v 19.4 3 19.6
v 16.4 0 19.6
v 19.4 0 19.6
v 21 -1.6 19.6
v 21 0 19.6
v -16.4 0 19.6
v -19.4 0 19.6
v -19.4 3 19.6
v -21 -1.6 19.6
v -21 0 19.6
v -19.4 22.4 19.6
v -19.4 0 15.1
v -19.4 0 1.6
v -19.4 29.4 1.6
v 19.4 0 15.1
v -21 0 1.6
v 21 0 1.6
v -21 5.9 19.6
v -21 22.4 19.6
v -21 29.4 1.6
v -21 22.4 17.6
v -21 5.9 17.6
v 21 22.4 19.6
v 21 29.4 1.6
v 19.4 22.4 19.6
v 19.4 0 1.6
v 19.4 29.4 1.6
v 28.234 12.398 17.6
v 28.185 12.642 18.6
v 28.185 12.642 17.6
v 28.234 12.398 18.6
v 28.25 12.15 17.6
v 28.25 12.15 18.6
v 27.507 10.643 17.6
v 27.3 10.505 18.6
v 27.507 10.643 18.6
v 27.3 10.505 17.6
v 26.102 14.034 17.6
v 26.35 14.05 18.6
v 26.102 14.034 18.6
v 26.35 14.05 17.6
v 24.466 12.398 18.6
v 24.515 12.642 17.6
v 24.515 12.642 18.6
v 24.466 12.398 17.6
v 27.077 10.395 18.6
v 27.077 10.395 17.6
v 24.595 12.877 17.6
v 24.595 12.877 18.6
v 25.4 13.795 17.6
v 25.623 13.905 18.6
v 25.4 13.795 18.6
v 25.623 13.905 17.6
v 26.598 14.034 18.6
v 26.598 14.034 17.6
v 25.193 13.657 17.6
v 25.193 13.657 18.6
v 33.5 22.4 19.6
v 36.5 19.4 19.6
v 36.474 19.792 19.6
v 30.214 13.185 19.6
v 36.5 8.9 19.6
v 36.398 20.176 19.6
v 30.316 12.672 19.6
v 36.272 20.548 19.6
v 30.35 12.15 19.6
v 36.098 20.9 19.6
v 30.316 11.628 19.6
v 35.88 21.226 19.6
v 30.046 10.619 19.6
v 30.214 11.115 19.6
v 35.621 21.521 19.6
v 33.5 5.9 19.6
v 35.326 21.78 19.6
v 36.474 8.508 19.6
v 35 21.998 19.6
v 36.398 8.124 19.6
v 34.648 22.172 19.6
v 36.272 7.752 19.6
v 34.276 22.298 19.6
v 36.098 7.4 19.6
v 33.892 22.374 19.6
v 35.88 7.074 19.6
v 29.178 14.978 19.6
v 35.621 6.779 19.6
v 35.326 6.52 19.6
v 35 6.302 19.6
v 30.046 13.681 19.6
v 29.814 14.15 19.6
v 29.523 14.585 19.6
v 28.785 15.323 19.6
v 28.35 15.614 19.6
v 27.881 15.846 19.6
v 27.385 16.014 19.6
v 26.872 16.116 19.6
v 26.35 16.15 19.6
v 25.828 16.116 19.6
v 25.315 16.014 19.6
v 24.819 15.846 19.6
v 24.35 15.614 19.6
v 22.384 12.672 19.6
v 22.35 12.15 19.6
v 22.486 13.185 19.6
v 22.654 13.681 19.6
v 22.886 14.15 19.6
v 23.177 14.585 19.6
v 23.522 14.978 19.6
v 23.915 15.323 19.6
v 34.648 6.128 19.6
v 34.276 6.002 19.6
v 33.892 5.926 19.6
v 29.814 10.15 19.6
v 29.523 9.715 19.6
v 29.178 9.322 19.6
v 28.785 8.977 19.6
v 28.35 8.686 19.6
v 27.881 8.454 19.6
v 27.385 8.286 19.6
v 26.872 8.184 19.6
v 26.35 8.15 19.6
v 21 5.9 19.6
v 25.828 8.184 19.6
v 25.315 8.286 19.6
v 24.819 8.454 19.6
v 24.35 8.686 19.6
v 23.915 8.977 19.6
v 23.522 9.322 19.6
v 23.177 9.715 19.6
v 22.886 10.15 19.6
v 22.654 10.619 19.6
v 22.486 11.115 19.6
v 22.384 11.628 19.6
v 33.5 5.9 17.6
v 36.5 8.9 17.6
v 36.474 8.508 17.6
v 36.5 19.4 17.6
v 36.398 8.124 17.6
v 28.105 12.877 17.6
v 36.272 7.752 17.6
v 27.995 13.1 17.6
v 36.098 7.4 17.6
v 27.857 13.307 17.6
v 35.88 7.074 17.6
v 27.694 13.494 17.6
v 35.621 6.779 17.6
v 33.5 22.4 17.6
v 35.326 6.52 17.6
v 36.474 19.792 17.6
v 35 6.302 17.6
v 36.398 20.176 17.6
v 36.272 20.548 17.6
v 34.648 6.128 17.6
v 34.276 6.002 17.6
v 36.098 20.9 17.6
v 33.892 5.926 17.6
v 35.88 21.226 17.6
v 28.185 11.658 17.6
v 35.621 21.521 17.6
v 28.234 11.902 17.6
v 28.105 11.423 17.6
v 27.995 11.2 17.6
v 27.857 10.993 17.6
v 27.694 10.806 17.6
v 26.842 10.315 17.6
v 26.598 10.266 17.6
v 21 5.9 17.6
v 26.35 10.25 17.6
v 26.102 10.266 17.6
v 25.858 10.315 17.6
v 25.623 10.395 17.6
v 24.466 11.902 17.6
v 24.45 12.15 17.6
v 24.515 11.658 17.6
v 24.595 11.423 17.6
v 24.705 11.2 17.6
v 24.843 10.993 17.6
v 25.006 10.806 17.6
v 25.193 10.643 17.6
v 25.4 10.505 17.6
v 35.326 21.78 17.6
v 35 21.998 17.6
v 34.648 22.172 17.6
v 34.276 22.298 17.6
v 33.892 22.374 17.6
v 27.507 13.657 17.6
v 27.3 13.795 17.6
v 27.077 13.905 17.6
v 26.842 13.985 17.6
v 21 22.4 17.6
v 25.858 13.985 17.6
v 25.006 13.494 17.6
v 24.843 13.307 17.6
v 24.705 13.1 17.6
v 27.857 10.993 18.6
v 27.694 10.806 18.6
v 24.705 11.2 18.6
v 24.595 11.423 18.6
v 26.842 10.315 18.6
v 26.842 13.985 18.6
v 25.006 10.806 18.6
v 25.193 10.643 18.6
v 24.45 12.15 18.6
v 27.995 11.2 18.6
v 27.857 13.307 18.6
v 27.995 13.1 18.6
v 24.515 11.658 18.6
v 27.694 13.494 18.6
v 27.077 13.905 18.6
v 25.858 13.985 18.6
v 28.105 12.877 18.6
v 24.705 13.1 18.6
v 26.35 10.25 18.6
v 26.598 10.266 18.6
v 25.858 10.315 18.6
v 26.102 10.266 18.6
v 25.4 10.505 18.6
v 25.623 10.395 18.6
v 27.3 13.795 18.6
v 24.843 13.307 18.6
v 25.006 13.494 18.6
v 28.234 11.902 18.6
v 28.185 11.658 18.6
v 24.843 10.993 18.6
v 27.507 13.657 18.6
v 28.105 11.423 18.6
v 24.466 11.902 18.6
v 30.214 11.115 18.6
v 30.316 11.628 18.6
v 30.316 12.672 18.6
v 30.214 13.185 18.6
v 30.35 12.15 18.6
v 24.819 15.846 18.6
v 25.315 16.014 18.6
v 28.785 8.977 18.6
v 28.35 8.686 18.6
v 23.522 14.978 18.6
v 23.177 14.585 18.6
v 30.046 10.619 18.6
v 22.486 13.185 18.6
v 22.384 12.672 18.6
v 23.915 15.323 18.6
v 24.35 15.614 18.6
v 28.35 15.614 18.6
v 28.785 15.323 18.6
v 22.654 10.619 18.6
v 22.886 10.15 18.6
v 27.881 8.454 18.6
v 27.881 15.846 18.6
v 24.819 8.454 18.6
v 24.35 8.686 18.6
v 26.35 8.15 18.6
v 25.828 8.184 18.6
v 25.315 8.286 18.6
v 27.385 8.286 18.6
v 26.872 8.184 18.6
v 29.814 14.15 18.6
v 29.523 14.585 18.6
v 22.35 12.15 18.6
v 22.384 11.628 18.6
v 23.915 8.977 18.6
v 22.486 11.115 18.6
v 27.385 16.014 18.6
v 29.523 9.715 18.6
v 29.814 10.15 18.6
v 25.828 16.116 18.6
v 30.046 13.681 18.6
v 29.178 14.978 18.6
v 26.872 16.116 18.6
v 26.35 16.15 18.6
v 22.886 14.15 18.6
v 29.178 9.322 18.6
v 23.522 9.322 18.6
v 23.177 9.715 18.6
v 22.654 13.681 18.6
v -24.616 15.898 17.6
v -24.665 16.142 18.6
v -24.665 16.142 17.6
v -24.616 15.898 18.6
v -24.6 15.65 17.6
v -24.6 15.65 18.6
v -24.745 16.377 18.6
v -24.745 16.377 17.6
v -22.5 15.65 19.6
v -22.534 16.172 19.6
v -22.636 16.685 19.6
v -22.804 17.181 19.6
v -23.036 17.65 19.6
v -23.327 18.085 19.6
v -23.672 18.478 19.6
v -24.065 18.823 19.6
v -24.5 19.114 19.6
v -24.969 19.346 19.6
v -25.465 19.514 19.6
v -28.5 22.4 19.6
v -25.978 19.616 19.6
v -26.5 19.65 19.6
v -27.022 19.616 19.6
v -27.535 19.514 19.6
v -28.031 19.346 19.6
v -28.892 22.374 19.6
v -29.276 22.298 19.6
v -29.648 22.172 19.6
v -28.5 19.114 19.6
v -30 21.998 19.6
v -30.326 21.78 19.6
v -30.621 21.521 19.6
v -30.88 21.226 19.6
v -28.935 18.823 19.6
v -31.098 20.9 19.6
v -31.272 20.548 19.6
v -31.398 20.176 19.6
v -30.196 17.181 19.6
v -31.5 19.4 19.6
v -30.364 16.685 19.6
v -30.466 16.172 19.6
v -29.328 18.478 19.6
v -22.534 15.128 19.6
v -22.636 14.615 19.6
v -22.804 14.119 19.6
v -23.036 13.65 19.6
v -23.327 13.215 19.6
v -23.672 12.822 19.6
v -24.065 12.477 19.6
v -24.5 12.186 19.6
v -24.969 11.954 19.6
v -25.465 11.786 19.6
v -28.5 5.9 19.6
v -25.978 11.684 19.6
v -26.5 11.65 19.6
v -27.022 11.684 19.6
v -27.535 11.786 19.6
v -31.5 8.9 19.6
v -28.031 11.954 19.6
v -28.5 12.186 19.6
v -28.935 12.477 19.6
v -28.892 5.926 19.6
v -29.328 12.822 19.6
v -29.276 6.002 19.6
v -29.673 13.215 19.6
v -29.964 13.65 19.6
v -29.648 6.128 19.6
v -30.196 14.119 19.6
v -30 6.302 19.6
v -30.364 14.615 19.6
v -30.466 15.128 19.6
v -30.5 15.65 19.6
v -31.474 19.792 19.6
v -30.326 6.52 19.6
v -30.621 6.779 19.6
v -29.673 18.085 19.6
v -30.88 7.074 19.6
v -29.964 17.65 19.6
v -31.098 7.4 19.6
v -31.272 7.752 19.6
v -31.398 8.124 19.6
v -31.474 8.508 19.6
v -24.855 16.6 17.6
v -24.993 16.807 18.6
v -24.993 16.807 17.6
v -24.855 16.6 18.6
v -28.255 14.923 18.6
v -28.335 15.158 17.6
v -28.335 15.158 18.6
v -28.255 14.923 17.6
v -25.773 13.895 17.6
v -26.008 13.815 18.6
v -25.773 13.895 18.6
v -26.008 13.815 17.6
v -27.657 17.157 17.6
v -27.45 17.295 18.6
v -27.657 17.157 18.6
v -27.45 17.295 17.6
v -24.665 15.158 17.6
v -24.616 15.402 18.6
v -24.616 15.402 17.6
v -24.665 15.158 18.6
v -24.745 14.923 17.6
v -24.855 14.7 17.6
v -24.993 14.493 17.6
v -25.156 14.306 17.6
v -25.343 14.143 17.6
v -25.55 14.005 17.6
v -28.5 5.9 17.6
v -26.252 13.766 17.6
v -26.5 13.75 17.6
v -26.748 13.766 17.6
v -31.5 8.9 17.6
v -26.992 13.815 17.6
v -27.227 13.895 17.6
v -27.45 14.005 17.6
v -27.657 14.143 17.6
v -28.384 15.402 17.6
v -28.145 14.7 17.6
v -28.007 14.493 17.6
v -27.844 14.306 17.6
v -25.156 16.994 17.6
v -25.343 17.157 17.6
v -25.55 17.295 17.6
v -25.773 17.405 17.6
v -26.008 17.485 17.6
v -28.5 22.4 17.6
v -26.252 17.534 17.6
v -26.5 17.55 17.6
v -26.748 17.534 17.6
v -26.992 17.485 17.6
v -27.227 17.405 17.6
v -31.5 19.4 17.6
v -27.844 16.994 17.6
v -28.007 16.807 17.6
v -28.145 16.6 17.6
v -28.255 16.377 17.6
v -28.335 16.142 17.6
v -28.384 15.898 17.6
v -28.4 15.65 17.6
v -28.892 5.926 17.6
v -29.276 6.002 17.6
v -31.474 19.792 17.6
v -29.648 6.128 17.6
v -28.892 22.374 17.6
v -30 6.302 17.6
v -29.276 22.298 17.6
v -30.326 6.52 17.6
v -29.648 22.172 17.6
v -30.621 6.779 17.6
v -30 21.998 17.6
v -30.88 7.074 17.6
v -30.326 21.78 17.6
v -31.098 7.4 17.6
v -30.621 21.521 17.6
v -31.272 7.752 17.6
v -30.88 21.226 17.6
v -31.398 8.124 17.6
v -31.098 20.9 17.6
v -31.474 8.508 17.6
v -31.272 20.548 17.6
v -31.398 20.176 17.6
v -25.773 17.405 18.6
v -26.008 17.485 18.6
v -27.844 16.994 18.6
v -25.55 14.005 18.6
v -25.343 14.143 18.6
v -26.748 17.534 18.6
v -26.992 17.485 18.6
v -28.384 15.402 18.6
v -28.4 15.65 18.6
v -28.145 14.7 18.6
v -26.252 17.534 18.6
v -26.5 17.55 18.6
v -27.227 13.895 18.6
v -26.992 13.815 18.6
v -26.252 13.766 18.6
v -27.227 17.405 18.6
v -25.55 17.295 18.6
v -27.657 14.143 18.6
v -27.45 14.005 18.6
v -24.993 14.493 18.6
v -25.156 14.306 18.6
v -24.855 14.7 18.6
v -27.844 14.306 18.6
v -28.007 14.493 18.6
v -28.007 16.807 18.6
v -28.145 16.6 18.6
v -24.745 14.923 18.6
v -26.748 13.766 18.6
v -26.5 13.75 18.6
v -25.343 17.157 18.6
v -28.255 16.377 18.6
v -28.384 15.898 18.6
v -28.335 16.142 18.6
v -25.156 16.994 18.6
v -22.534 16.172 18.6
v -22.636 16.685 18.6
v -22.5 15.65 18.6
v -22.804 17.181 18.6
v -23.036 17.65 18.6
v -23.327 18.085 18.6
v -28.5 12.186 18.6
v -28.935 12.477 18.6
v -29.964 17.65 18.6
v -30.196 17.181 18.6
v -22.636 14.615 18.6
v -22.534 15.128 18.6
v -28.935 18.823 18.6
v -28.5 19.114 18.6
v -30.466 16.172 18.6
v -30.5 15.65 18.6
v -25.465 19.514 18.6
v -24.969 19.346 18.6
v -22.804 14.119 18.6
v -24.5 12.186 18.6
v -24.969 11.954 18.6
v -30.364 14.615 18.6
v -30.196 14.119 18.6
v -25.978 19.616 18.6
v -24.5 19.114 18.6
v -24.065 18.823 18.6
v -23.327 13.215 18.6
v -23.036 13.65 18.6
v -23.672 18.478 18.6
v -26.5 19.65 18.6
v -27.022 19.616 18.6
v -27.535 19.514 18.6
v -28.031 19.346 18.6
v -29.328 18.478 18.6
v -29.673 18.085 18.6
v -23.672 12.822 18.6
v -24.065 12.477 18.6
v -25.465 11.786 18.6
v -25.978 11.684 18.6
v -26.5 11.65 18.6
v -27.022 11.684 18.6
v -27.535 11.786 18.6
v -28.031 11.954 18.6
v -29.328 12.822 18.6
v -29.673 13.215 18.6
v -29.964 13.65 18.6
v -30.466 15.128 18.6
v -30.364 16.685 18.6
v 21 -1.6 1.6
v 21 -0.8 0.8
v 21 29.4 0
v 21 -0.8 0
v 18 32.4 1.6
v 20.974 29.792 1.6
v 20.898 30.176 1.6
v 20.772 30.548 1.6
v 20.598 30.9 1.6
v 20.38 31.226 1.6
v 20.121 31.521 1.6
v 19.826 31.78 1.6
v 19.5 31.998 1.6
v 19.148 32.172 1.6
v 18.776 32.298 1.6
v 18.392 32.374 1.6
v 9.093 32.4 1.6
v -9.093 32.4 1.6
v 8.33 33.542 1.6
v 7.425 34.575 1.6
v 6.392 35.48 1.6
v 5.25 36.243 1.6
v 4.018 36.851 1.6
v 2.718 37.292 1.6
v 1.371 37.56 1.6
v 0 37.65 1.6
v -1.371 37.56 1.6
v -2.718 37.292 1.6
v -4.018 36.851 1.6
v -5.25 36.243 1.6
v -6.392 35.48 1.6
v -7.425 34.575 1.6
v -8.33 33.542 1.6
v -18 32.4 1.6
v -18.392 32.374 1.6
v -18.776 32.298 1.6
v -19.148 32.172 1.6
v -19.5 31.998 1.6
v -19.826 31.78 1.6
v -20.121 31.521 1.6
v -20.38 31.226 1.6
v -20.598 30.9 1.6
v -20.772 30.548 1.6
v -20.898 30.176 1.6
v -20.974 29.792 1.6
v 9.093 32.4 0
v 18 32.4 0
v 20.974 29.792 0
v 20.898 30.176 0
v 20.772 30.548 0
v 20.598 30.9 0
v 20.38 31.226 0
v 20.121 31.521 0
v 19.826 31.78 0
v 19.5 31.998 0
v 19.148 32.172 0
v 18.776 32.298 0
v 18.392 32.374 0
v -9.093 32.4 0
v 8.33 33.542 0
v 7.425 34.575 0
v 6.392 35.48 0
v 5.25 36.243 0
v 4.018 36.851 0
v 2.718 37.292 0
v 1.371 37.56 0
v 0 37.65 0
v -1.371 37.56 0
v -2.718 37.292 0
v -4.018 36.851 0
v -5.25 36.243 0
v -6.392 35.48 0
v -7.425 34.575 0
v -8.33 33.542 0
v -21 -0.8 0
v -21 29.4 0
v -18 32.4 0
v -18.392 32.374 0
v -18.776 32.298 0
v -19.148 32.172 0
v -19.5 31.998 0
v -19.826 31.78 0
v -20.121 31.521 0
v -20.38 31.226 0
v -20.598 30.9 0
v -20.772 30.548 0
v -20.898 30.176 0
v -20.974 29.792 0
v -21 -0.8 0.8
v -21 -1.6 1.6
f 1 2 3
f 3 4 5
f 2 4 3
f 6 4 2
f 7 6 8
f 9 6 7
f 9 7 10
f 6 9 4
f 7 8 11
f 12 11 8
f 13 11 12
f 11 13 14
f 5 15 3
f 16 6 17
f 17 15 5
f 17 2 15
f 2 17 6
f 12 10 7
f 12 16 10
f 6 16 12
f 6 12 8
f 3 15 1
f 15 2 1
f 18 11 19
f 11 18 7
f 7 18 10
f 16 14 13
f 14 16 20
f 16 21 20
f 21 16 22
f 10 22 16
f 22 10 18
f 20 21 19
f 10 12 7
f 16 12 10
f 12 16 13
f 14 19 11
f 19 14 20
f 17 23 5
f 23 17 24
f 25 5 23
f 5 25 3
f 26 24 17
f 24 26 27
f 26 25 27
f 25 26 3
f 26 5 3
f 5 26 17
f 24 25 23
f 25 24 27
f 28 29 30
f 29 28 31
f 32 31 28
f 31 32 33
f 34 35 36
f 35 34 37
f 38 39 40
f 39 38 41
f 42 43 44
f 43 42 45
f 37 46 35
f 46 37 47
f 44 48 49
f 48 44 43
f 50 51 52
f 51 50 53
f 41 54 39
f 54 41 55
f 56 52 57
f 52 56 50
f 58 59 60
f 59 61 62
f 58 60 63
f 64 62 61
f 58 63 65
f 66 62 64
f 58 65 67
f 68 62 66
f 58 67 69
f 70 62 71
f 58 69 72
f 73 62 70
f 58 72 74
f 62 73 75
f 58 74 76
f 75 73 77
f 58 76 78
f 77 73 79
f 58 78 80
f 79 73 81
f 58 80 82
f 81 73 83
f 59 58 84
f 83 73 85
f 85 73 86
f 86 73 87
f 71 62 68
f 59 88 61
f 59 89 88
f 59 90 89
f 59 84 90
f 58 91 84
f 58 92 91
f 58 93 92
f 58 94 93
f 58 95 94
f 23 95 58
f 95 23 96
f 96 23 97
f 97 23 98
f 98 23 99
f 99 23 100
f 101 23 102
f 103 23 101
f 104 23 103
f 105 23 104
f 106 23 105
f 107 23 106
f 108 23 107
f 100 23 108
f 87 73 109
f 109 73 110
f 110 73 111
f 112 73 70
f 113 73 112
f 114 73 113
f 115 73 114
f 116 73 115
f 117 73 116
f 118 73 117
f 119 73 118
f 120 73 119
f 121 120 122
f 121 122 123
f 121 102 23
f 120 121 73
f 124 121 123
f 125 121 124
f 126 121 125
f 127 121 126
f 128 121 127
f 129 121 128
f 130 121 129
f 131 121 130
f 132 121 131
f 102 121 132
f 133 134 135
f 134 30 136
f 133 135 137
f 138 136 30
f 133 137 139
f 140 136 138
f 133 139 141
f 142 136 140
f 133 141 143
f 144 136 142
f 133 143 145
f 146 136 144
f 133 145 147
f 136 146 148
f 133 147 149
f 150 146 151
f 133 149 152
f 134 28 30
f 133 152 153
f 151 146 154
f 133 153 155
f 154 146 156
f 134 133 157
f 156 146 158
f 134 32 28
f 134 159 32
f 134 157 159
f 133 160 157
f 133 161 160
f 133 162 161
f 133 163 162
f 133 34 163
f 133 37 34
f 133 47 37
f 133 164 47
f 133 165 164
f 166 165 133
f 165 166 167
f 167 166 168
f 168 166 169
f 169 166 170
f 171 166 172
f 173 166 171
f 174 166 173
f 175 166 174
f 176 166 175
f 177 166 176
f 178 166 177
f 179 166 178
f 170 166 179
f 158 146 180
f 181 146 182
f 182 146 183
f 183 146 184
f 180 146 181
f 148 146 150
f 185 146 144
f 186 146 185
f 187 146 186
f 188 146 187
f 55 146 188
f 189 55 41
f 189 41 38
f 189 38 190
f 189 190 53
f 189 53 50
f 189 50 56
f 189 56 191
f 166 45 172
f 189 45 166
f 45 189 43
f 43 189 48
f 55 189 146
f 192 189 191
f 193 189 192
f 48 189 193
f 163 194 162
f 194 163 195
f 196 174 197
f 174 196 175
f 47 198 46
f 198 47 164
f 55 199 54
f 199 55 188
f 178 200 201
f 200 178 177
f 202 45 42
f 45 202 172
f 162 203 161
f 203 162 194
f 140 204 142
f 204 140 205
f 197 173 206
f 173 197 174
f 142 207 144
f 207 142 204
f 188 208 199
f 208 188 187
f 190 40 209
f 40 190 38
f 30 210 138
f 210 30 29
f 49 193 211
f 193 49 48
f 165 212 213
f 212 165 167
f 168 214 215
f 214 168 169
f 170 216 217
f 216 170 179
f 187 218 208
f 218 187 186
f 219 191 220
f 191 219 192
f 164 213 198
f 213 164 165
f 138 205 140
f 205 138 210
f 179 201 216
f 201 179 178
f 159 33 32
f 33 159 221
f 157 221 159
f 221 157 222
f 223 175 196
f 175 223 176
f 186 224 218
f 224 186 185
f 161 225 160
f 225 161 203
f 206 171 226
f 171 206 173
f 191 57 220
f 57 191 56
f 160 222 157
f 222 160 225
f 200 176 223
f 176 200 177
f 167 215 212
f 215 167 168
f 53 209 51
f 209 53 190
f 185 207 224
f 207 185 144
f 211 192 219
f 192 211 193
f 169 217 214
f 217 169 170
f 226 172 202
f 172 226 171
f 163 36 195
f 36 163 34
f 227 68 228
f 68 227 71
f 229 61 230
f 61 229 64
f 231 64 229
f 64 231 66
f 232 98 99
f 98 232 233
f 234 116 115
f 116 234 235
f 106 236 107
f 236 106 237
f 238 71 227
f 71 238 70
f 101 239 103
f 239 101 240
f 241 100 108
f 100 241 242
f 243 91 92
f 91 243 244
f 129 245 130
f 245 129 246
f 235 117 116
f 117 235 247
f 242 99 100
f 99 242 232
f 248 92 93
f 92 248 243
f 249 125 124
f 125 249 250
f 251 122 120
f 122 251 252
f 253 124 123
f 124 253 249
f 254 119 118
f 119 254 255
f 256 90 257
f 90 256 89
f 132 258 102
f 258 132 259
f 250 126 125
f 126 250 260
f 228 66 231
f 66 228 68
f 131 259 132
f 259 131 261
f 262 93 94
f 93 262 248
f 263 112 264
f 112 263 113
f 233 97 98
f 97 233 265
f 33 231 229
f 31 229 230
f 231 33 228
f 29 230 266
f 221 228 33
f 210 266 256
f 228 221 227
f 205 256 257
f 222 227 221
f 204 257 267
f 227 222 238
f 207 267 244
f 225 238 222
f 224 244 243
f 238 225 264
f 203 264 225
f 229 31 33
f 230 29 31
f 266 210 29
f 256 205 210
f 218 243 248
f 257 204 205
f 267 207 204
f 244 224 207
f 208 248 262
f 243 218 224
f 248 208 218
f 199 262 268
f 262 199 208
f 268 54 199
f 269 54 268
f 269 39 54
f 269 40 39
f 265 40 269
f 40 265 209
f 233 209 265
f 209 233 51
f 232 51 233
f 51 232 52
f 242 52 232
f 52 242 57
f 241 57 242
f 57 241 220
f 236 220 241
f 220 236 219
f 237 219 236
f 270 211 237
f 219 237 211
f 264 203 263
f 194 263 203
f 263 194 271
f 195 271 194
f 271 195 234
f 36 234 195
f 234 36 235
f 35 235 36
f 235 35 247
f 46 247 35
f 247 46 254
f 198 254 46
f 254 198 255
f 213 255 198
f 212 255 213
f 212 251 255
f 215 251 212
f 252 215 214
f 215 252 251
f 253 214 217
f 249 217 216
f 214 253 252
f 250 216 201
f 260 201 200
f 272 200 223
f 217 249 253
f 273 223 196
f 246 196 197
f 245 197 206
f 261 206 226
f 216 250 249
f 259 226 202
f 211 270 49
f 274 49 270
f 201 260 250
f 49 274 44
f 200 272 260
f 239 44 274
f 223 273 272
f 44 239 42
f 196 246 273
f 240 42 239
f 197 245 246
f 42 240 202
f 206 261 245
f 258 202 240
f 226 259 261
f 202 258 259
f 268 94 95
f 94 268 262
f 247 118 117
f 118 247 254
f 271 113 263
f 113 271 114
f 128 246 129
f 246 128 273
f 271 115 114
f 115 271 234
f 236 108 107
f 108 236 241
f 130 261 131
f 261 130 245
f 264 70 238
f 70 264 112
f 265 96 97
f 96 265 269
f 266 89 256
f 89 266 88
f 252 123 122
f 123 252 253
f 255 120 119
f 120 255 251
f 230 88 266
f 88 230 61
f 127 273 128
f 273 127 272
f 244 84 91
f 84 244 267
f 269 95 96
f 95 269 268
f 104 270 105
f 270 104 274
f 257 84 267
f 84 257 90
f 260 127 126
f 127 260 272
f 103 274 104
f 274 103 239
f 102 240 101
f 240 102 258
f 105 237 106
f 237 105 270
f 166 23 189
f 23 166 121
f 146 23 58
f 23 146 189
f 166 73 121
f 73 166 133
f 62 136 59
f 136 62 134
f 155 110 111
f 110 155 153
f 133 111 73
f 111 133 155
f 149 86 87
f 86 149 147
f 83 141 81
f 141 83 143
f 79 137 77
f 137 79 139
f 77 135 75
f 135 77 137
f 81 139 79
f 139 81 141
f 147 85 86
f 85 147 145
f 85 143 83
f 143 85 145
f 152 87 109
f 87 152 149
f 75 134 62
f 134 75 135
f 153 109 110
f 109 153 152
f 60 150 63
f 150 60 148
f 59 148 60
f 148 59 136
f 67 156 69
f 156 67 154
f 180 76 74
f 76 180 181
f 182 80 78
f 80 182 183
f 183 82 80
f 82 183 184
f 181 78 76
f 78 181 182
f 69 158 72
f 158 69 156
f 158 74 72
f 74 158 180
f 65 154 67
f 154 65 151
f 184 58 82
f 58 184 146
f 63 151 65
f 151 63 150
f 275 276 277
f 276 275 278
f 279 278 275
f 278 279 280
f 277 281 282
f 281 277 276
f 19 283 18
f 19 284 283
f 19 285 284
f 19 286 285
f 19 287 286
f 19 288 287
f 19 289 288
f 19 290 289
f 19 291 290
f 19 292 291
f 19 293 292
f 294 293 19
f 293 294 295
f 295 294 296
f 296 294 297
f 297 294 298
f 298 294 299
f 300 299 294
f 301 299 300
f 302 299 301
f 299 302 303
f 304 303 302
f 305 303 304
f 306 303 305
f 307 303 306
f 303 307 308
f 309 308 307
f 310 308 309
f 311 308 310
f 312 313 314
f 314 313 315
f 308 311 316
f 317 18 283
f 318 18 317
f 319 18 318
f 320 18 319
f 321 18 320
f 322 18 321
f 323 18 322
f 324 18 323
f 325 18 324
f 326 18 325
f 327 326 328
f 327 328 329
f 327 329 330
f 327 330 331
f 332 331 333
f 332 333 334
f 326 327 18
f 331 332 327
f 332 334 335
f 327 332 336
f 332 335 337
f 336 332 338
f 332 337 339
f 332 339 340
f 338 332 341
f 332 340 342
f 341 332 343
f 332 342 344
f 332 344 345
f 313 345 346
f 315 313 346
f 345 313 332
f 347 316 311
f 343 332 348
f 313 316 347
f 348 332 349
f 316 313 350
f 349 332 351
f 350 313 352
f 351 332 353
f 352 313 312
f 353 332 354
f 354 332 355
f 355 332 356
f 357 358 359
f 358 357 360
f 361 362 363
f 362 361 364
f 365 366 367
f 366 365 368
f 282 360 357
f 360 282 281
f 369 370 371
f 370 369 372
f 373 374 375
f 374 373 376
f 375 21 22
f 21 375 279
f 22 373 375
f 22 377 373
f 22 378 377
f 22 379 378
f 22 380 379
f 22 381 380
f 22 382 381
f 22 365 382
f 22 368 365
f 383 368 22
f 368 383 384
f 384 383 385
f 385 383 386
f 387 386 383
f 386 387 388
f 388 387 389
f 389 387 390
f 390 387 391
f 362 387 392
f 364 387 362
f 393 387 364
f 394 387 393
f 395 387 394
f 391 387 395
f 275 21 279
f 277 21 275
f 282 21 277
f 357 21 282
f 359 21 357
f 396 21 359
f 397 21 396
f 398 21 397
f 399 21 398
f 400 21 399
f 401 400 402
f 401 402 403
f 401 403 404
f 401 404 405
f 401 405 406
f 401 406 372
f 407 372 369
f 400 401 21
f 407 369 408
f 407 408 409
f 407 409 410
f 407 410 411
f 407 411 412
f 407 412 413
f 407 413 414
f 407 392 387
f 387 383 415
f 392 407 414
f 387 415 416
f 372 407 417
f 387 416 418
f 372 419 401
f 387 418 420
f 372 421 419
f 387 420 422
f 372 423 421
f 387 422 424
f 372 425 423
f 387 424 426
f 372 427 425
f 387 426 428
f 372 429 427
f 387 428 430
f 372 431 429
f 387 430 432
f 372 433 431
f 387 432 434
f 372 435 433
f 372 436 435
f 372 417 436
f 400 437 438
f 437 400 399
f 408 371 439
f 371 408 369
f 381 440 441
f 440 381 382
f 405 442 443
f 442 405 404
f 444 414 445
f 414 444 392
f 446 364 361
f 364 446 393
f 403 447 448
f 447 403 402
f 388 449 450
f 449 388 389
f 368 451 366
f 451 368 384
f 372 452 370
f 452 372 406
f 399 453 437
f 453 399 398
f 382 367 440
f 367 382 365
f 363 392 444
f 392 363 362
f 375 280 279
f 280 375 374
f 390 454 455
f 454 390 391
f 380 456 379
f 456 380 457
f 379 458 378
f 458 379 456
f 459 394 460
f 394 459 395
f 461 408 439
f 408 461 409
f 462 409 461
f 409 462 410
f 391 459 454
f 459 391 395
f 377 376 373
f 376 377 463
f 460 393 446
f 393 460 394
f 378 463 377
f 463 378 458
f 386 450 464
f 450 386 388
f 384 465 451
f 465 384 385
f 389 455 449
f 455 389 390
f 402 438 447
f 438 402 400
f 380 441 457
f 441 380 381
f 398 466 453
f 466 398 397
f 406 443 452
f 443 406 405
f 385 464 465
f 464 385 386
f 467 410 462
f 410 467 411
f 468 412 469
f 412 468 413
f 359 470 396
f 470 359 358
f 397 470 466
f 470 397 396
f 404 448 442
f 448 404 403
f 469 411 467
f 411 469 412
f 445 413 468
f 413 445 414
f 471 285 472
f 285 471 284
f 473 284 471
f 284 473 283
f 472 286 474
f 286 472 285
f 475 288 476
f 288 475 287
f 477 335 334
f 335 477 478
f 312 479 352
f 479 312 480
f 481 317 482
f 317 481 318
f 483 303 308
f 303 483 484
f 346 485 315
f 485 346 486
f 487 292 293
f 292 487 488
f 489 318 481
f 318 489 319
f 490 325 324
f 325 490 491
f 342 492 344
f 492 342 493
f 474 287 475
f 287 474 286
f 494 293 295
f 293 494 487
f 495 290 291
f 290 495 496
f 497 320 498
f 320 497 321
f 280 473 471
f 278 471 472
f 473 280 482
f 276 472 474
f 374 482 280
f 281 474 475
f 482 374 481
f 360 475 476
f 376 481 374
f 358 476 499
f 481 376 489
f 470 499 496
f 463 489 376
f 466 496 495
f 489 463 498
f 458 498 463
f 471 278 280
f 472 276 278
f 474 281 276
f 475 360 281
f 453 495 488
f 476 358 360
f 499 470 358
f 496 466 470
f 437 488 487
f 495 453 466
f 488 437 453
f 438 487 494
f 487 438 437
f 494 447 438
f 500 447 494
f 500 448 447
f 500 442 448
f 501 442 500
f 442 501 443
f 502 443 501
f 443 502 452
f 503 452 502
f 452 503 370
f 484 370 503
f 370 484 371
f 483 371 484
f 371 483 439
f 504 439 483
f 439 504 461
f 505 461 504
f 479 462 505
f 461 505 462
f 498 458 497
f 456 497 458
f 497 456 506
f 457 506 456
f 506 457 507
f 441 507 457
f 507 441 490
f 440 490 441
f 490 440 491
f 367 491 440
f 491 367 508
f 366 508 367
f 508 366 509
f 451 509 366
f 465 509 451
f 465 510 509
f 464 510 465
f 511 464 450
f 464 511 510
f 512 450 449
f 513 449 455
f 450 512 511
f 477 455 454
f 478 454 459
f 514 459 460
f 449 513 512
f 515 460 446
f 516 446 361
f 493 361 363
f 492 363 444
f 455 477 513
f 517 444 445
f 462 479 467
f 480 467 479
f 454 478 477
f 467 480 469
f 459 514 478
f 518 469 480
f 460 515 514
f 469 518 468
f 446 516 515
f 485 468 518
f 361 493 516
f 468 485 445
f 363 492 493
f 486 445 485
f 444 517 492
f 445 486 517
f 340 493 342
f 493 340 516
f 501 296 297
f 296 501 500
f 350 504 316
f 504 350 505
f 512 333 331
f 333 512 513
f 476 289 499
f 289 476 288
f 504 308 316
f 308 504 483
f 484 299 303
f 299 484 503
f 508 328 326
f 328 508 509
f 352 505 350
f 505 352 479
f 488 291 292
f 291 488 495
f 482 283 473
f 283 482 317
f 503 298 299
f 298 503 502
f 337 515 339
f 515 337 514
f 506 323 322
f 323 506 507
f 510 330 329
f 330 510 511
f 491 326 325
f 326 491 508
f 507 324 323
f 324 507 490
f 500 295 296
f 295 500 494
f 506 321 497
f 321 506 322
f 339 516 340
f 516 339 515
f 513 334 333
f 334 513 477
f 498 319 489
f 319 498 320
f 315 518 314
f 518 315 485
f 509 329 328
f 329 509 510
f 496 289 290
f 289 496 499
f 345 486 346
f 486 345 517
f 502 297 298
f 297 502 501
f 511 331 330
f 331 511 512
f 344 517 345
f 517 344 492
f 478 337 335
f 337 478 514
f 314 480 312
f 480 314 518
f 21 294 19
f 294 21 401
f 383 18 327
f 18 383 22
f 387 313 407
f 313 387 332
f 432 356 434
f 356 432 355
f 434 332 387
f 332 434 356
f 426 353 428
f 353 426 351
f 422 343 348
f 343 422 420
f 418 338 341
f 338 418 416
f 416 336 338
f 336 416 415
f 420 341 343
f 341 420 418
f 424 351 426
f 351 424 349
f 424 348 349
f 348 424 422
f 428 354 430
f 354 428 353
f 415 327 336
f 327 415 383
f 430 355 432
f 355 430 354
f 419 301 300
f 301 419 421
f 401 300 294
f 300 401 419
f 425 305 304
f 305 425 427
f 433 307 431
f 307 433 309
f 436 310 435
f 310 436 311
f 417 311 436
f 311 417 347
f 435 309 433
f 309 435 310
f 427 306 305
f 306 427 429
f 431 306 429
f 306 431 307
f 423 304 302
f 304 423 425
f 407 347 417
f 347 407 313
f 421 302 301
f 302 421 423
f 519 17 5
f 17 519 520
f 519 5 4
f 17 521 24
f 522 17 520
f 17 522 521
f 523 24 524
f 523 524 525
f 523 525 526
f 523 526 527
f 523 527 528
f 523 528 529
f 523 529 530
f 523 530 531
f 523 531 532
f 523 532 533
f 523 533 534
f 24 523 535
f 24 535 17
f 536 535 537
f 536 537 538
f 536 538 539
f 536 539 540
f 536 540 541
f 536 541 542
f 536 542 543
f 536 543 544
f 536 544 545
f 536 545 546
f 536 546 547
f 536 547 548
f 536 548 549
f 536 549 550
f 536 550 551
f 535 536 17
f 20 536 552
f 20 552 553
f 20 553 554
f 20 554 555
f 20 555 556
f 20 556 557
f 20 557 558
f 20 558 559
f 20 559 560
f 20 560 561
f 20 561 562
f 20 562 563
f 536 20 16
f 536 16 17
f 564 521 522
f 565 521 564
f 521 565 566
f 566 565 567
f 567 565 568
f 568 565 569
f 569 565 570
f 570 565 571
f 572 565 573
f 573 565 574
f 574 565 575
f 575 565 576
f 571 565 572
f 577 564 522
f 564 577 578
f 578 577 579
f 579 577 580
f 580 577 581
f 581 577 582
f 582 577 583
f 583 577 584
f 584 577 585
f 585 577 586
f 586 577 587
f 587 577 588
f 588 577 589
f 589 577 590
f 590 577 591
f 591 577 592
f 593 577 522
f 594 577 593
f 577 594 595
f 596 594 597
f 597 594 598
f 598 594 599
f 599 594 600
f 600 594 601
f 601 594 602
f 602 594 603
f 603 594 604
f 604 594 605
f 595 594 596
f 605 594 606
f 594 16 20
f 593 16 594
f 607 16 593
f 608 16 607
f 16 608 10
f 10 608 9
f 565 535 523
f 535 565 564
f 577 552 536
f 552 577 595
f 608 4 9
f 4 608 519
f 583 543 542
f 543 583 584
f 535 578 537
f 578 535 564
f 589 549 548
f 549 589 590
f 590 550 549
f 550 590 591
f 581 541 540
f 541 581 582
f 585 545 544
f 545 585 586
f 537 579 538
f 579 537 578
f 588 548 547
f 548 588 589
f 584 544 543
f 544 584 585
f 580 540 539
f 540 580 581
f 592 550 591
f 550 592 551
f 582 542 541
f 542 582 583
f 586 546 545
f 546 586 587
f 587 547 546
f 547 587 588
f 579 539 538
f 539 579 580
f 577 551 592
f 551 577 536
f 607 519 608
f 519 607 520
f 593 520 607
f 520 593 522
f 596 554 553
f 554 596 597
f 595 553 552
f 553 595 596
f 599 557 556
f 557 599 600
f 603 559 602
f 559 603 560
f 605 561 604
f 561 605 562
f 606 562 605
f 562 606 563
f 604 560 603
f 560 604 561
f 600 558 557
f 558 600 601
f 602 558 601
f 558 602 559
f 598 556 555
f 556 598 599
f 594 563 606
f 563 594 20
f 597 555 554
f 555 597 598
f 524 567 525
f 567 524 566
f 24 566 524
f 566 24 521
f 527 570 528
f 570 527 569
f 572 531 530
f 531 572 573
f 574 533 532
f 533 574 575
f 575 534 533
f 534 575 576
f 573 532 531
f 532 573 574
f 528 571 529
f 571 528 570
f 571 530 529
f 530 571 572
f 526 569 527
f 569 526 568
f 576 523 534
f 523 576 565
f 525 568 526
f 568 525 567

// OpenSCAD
// file: hash.scad
//
// Copyright (c) Stewart H. Whitman, 2020.
//
// File:    hash.scad
// Project: General
// License: CC BY-NC-SA 4.0 (Attribution-NonCommercial-ShareAlike)
// Desc:    Implementation of a hash structure.
//

// hash can be initialized like:
//
//   hash_v = hash_add( hash_add( hash_initialize(), "key1", "value1" ), "key2", value2 );
//
// or perhaps more clearly like:
//
//   hash_v = [
//     [ "key1", "value1" ],
//     [ "key2", value2 ],
//   ];
//
// Then values can be retrieved by:
//
//   v = hash_get( hash_v, "key1" );
//

// hash_initialize:
//
// Returns initialization of a hash.
//
function hash_initialize() = [];

// hash_add:
//
// Adds <key>:<value> to <hash>. This does not check for duplicates. Use hash_set to remove duplicates.
//
function hash_add( hash, key, value ) = assert( is_list(hash) ) concat( hash, [[key, value]] );

// hash_size:
//
// Returns the size of <hash>.
//
function hash_size( hash ) = assert( is_list(hash) ) len(hash);

// hash_is_empty:
//
// Returns true if <hash> is empty.
//
function hash_is_empty( hash ) = len(hash) == 0;

// hash_keys:
//
// Return the keys of <hash> in an array.
//
function hash_keys( hash ) = assert( is_list(hash) ) [ for( i = hash ) i[0] ]; 

// hash_values:
//
// Return the values of <hash> in an array.
//
function hash_values( hash ) = assert( is_list(hash) ) [ for( i = hash ) i[1] ]; 

// hash_get:
//
// Returns the value associated with key <key> from <hash> or undef if it does not exist.
//
function hash_get_internal_( hash, key, _i = 0 ) = (_i >= len(hash)) ? undef : (hash[_i][0] == key) ? hash[_i][1] : hash_get_internal_( hash, key, _i+1 );
function hash_get( hash, key ) = assert( is_list(hash) ) hash_get_internal_( hash, key );

// hash_get_default:
//
// Returns the value associated with key <key> from <hash> or <default_value> if it does not exist.
//
function hash_get_default( hash, key, default_value ) = hash_exists( hash, key ) ? hash_get( hash, key ) : default_value; 

// hash_get_default_hash:
//
// Returns the value associated with key <key> from <hash>, falling back to <default_hash> if it does not exist.
//
function hash_get_default_hash( hash, key, default_hash ) = hash_exists( hash, key ) ? hash_get( hash, key ) : hash_get( default_hash, key ); 

// hash_exists:
//
// Returns true if the key <key> exists in <hash>.
//
function hash_exists( hash, key ) = !is_undef( hash_get( hash, key ) );

// hash_delete:
//
// Deletes key <key> from <hash> if it exists and returns the new hash.
//
function hash_delete_internal_( hash, key, _i = 0, _v = [] ) = (_i >= len(hash)) ? _v : hash_delete_internal_( hash, key, _i+1, hash[_i][0] == key ? _v : concat(_v,[hash[_i]]) );
function hash_delete( hash, key ) = assert( is_list(hash) ) hash_delete_internal_( hash, key );

// hash_set:
//
// Set key <key> to associated <value> in <hash>, deleting it if it already exists,  and returns the new hash.
//
function hash_set( hash, key, value ) = hash_exists( hash, key ) ? hash_add( hash_delete( hash, key ), key, value ) : hash_add( hash, key, value );
// file: smidge.scad
//
// Copyright (c) Stewart H. Whitman, 2020.
//
// File:    smidge.scad
// Project: General
// License: CC BY-NC-SA 4.0 (Attribution-NonCommercial-ShareAlike)
// Desc:    SMIDGE constant used in preview mode.
//

// Smidge constant for rendering only (to avoid Z-axis fighting, etc.)
SMIDGE = $preview ? 0.001 : 0;
// file: primitives.scad
//
// Copyright (c) Stewart H. Whitman, 2020.
//
// File:    primitives.scad
// Project: Dell Wyse 5070 2nd Ethernet Adapter Adapter
// License: CC BY-NC-SA 4.0 (Attribution-NonCommercial-ShareAlike)
// Desc:    Shape primitives
//
// $Header$
//

include <smidge.scad>;

// Creates a right triangle with <height> and <base> and extrudes it
// to <thickness>.
//
module right_triangle(height, base, thickness) {
  translate( [+thickness,0,0] ) rotate( [0,-90,0] ) linear_extrude( height=thickness ) polygon( [[0,0], [0,height], [base,0]] );
} // end right_triangle

// Create a half cylinder
module half_cylinder(r,h,center=false) {
  translate( [center ? -h/2 : 0, 0, 0] )
    rotate( [90,0,0] ) rotate( [0,90,0] )
    difference() {
      cylinder( r=r, h=h );
      translate( [-2*r,-r, -SMIDGE ] ) cube( [ 2*r,2*r,h+2*SMIDGE] );
    }
} // end half_cylinder

// Create a triangle with 2 sides the same
module equi_triangle(height_and_base, thickness,center=false) {
  translate( [ center ? -thickness/2 : 0, 0, 0 ] ) {
    right_triangle(height_and_base, height_and_base, thickness);
    mirror( [0,0,1] ) right_triangle(height_and_base, height_and_base, thickness);
  }
} // end equi_triangle

// Create a somewhat complex tang (a right triangle over a cube)
module tang(l,h,w,percent=25,center=false) {
  assert( percent > 0 && percent < 100 );
  //echo( ["tang",l,w,h,percent] );

  p = percent/100;

  translate( [-w/2,0,center?-h/2 : 0] ) {
    translate( [0,0,p*h] )
      right_triangle(l,(1-p)*h,w);
    cube( [w,l,p*h] );
  }
} // end tang

// Create a somewhat complex tang (a right triangle over another triangle)
module tang2(l,h,w,percent=25,center=false) {
  assert( percent > 0 && percent < 100 );
  //echo( ["tang2",l,h,w,percent] );

  p = percent/100;

  translate( [-w/2,0,center?-h/2 : 0] ) {
    translate( [0,0,p*h] )
      right_triangle(l,(1-p)*h,w);
    translate( [0,0,p*h] )
      mirror( [0,0,1] ) right_triangle(l,p*h,w);
  }
} // end tang2

// Create a gusset (pyramid that fits in corner)
module gusset(width,height=0,center=true) {
  w = width;
  h = height == 0 ? w : height;
  translate( [0,0,center?-h/2:0] )
    polyhedron( points=[[0,0,0], [w,0,h], [0,0,h], [0,w,h]],
                faces=[[1,2,3],[0,1,3],[0,2,1],[0,3,2]] );
} // end gusset

// A corner rounding shape for a designated corner (on the XY plane)...
module round_corner_xy(radius,v,direction) {
  assert( direction >= 0 && direction <= 3 );

  if( radius > 0 ) {
    // Additional amount on Z
    z_multiplier = 2;
    z_translate  = [ [-1, -1, 0], [+1, -1, 0], [+1, +1, 0], [-1, +1, 0] ];

    // Get an inverted quarter pie slice
    color( "purple" )
    translate( [v.x,v.y,0] )
      translate( z_translate[direction]*radius )
	rotate( [0,0,90*direction] )
	  difference() {
	    translate( [0,0,-v.z*z_multiplier/4] ) cube( [radius+SMIDGE,radius+SMIDGE,v.z*z_multiplier] );
	    translate( [0,0,v.z*z_multiplier/4] ) cylinder( v.z*z_multiplier+SMIDGE, r=radius, center=true );
	  }
  }
} // end round_corner_xy

// A corner rounding shape for a designated corner (on the YZ plane)...
module round_corner_yz(radius,v,direction) {
  assert( direction >= 0 && direction <= 3 );

  if( radius > 0 ) {
    // Additional amount on X
    x_multiplier = 2;
    x_translate  = [ [0, -1, +1], [0, -1, -1], [0, +1, -1], [0, +1, +1] ];

    // Get an inverted quarter pie slice
    color( "purple" )
      translate( [0,v.y,v.z] )
	translate( x_translate[direction]*radius )
	  rotate( [90*direction,0,0] )
	  rotate( [0,90,0] )
	    difference() {
	      translate( [0,0,-v.x*x_multiplier/4] ) cube( [radius+SMIDGE,radius+SMIDGE,v.x*x_multiplier] );
	      translate( [0,0,v.x*x_multiplier/4] ) cylinder( v.x*x_multiplier+SMIDGE, r=radius, center=true );
	    }
  }
} // end round_corner_yz

// A corner rounding shape for a designated corner (on the XZ plane)...
module round_corner_xz(radius,v,direction) {
  assert( direction >= 0 && direction <= 3 );

  if( radius > 0 ) {
    // Additional amount on Y
    y_multiplier = 2;
    y_translate  = [ [-1, 0, -1], [-1, 0, +1], [+1, 0, +1], [+1, 0, -1] ];

    // Get an inverted quarter pie slice
    color( "purple" )
      translate( [v.x,0,v.z] )
	translate( y_translate[direction]*radius )
	  rotate( [0,90*direction,0] )
	  rotate( [90,0,0] )
	    difference() {
	      translate( [0,0,-v.y*y_multiplier/4] ) cube( [radius+SMIDGE,radius+SMIDGE,v.y*y_multiplier] );
	      translate( [0,0,v.y*y_multiplier/4] ) cylinder( v.y*y_multiplier+SMIDGE, r=radius, center=true );
	    }
  }
} // end round_corner_xz
// main file
//
// Copyright (c) Stewart H. Whitman, 2020.
//
// File:    wyse-blank.scad
// Project: Dell Wyse 5070 2nd Ethernet Adapter Adapter
// License: CC BY-NC-SA 4.0 (Attribution-NonCommercial-ShareAlike)
// Desc:
//
// $Header$
//

include <primitives.scad>
include <smidge.scad>
include <hash.scad>

// Layout...
//  all sizes in mm

// Depth in front of the back of the ears (minimal)
raw_depth = 24;

// Inner width
raw_width = 42;

// Thickness of base
default_thickness = 1.6;

// Extra depth is entirely dependent on the thing put inside
default_extra_depth = 10;

// Default round over radius for trough (does provide corner support)
default_trough_round_over = 6;

// Default round over radius for main body (mainly decorative)
default_round_over = 3;

// Support thickness
default_support_thickness = 1.6;

// Baffle Height (below the top of the "ears")
default_baffle_height = 18;

// Baffle thickness
default_baffle_thickness = 1.6;

// Front cut size
default_front_cut = [ default_baffle_thickness/2, default_thickness ];

// Hash
default_config = [
  ["thickness", default_thickness],
  ["extra_depth", default_extra_depth],
  ["baffle_height", default_baffle_height],
  ["baffle_thickness", default_baffle_thickness],
  ["support_thickness", default_support_thickness],
  ["round_over", default_round_over],
  ["trough_round_over", default_trough_round_over],
  ["front_cut", default_front_cut],
];
function GV_(config,var) = assert( is_list(config) ) hash_get_default_hash( config, var, default_config );

function Wyse_Get_Raw_Depth() = raw_depth;

function Wyse_Get_Raw_Width() = raw_width;

function Wyse_Get_Interior_Depth(config) = raw_depth + GV_(config,"extra_depth") - GV_(config,"baffle_thickness");

function Wyse_Get_Interior_Width(config) = raw_width - 2*GV_(config,"support_thickness");

function Wyse_Get_Interior_Size(config) = [ Wyse_Get_Interior_Width(config), Wyse_Get_Interior_Depth(config) ];

function Wyse_Get_Floor_Thickness(config) = GV_(config,"thickness");

// Center the blank (N.B. does not include the handle)...
module Wyse_Blank_Center(config) {
  translate( [ 0, -Wyse_Get_Interior_Depth(config)/2, 0 ] ) children();
} // end Wyse_Blank_Center

// Cutout the 2-dimensional children from the baffle
module Wyse_Baffle_Cutout( config, pos ) {
  baffle_thickness = GV_(config,"baffle_thickness");
  thickness = GV_(config,"thickness");

  SMIDGE=0.001;
  color("yellow" )
    translate( [pos.x, -baffle_thickness-SMIDGE, thickness+pos.y] )
      rotate( [90,0,180] )
        linear_extrude( baffle_thickness+2*SMIDGE ) children();
} // end Wyse_Baffle_Cutout

// Position a mount
module Wyse_Mount( config, pos, radius, extra_height=0, simple=false ) {
  thickness = GV_(config,"thickness");
  interior_size = Wyse_Get_Interior_Size( config );

  p = concat( pos, 0 );
  h = thickness+extra_height;
  translate( p ) {
    color("orange")
      union() {
	// Mount tapered downward for strength/hold
	cylinder( h, r=radius );

        // Fill-in support area to left/right with 2 rectangles
        if( !simple && p.y != 0 ) {
	  translate( [ ((p.x < 0) ? -interior_size.x/2+abs(p.x) : 0), -p.y, 0 ] ) cube( [ interior_size.x/2-abs(p.x), p.y+radius, h ] );
	  translate( [ ((p.x < 0) ? -interior_size.x/2+abs(p.x) : -radius), -p.y, 0 ] ) cube( [ interior_size.x/2-abs(p.x)+radius, p.y, h ] );
        }
      }
  }
} // end Wyse_Mount

// Position a hole
module Wyse_Hole( config, pos, radius, extra_height=0, countersink=false) {
  thickness = GV_(config,"thickness");

  p = concat( pos, -SMIDGE );
  h = thickness+extra_height;

  translate( p ) cylinder( h+2*SMIDGE, r=radius );

  if( countersink ) {
    m_radius = min( radius+h, radius*2 );
    translate( p ) cylinder( h=m_radius, r1=m_radius, r2=0 ); 
  }
} // end Wyse_Hole

// Position a nub
module Wyse_Nub( config, pos, radius, height, percent=50) {
  assert( percent >= 0 && percent <= 100 );

  thickness = GV_(config,"thickness");

  p = concat( pos, 0 );

  h_per   = percent/100;
  h_cyl   = thickness+h_per*height;
  h_cone  = (1-h_per)*height;

  translate( p ) cylinder( h_cyl, r=radius );
  if( h_cone > 0 )
    translate( p + [0,0,h_cyl] ) cylinder( h_cone, r1=radius, r2=0 );
} // end Wyse_Nub

// Position a latch
module Wyse_Latch( config, pos, width, latch_size=1, style="tang" ) {
  assert( style == "cylinder" || style == "triangle" || style == "square" || style == "tang" || style == "tang2" );
  thickness = GV_(config,"thickness");

  p = [ pos.x, pos.y, thickness ];
  latch_height = pos.z;

  // If a rear latch, build support attachment
  if( p.y > 0 ) {
    s = latch_height + (style == "square" ? latch_size : 2*latch_size);

    translate( p + [-width/2, 0, 0] ) color( "silver" )
      cube( [width, s/4, s] );

    translate( p + [-width/2, s/4, 0] ) color( "silver" )
      right_triangle( s/2, s, width );
  }

  translate( p + [ 0, 0, latch_height+latch_size] )
    rotate( [0, 0, p.y > 0 ? 180 : 0] ) {
      // Tang - Top triangle with cube below
      if( style == "tang" )
	tang( latch_size, 2*latch_size, width, center=true );
      // Tang - Two triangles of different sizes
      else if( style == "tang2" )
	tang2( latch_size, 2*latch_size, width, center=true );
      // Tang - half-round cylinder
      else if( style == "cylinder" )
	half_cylinder( latch_size, width, center=true );
      // Tang - like >
      else if( style == "triangle" )
	equi_triangle( latch_size, width, center=true );
      // Tang - 1/2 square
      else if( style == "square" )
	translate( [0, (p.y > 0 ? -1 : +1) * latch_size/2, -latch_size/2] ) cube( [ width, latch_size, latch_size ], center=true );
    }
} // end Wyse_Latch

// Position a guide parallel to the edge of the board
module Wyse_Guide( config, pos, size ) {
  thickness = GV_(config,"thickness");
  p = concat( pos, thickness ); 
  translate( p + [p.x < 0 ? -size.x : 0, 0, 0] ) cube( size ); 
} // end Wyse_Guide

// Cut a trough in the floor. Indent size is [front,rear,left,right]
module Wyse_Trough( config, indent_size, round_over=undef, trough_thickness=undef ) {
  assert( is_list(indent_size) && len(indent_size) == 4 );

  thickness      = GV_(config,"thickness");
  cut_thickness  = is_undef(trough_thickness) ? thickness : trough_thickness;
  cut_round_over = is_undef(round_over) ? GV_(config,"trough_round_over") : round_over;

  if( cut_thickness ) {
    interior_size = Wyse_Get_Interior_Size(config);

    indent_depth = indent_size[0]+indent_size[1]; // Front + Rear
    indent_width = indent_size[2]+indent_size[3]; // Left + Right

    v = concat( interior_size - [indent_width, indent_depth], cut_thickness+2*SMIDGE ); 

    color( "silver" )
      translate( [-interior_size.x/2+indent_size[2], indent_size[0], thickness - cut_thickness - SMIDGE ] )
	difference () {
	  cube( v );
	  round_corner_xy( cut_round_over, [0,v.y,v.z], 1 );
	  round_corner_xy( cut_round_over, [v.x,v.y,v.z], 0 );
	}
  }
} // end Wyse_Trough

// Extra depth (Completely depends on adapter)
module Wyse_Blank( config=[], filler_only=false ) {

  function V_(key) = assert(is_list(config)) hash_get_default_hash( config, key, default_config );

  extra_depth = V_("extra_depth");
  baffle_height = V_("baffle_height");
  baffle_thickness = V_("baffle_thickness");
  support_thickness = V_("support_thickness");
  round_over = V_("round_over");
  thickness = V_("thickness");
  front_cut = V_("front_cut");

  // Total depth
  inner_depth = raw_depth + extra_depth;

  // Total width
  inner_width = raw_width;

  // Upside down build
  upside_down = filler_only;

  // Ear parameters:
  //
  // The bigger ear (fka. "right") is colored "green". It is closer to the
  // base of the computer.
  //
  // The smaller ear (fka. "left") is colored "blue". It is closer to the
  // top of the computer.
  //
  // The screws used are M3 and you want slim heads (sometimes called "wafer"
  // heads). The screw holes are over-sized, with the computer providing
  // metal threads. The M3 screw parameters are: diameter 3mm, head diameter
  // about 6.25mm, head thickness a little less than 1mm.
  //
  // The hole positions are relative to the center of the ear. The holes
  // are slightly off-center and at different positions.
  //

  // Ear thickness
  ear_thickness = filler_only ? 1.4 : 2;

  // Ear right width
  ear_big_width = 14.5;
  ear_big_hole = [-1.9, -2];

  // Ear left width
  ear_small_width = 9.5;
  ear_small_hole = [-0.75, +1.5];

  // Ear depth (the length of the ears is the same on both sides)
  ear_depth = 16.5;

  // Ear lobe (provides a locking and aligning mechanism)
  // This is really unused, since we build right-side up and 3d printing
  // with support is more of a pain than it's worth.
  ear_lobe_depth = ear_depth;
  ear_lobe_width = 1;
  ear_lobe_height = upside_down ? ear_thickness+0.75 : ear_thickness;

  // Hole radius for sized for M3 mounting screws
  // Diameter is about 3mm, head size is about 6.25mm
  ear_hole_radius = 3.8/2;
  ear_hole_recess_radius = 4;
  // Recess thickness is based on there needing at least 1mm to clamp, or recess of 1mm to conceal screw head
  ear_hole_recess_thickness = upside_down ? 0 : ((ear_thickness > 2) ? 1 : ear_thickness-1);

  module base() {
    color("gray") cube( [inner_width,inner_depth,thickness] );
  } // end base

  module handle() {
    color("gray") translate( [inner_width/2,inner_depth-inner_width/8,0] ) cylinder( r=inner_width/4, h=thickness );
  } // end handle

  module baffle() {
    color("red") translate( [ 0, 0, thickness ] ) cube( [inner_width,baffle_thickness,baffle_height] );
  } // end baffle

  module support() {
    if( support_thickness ) {
      if( filler_only )
	color("brown") right_triangle( inner_depth-baffle_thickness, baffle_height, support_thickness );
      else {
	color("brown") cube( [support_thickness, raw_depth-baffle_thickness, baffle_height] );
        if( inner_depth-raw_depth > round_over )
	  translate( [0,raw_depth-baffle_thickness,0] ) color("brown") right_triangle( inner_depth-raw_depth-round_over, baffle_height, support_thickness );
      }
    }
  } // end support

  module lobe() {
    color("red") cube( [ear_lobe_width,ear_lobe_depth,ear_lobe_height] );
  } // end lobe

  module hole(c,d,r=ear_hole_radius) {
    translate( c/2 + concat( d, 0 ) ) cylinder( c.z+2*SMIDGE, r=r, center = true );
  } // end hole

  module hole_with_recess(c,d,r=ear_hole_radius,recess_thickness=ear_hole_recess_thickness,r_recess=ear_hole_recess_radius) {
    hole( c, d, r );
    if( recess_thickness >= 0 )
      translate( [ c.x/2, c.y/2, c.z-recess_thickness/2 ] + concat(d,0) ) cylinder( recess_thickness+SMIDGE, r=ear_hole_recess_radius, center=true );
  } // end hole_with_recess

  module small_ear() { // fka. left
    c = [ear_small_width,ear_depth,ear_thickness];
    difference() {
      union() {
	color("blue") difference() { cube( c ); hole_with_recess( c, ear_small_hole ); }
	translate( [-ear_lobe_width,ear_depth-ear_lobe_depth,upside_down?0:-ear_lobe_height+ear_thickness] ) lobe();
      }
      round_corner_xy( round_over, [-ear_lobe_width,0,ear_lobe_height], 2 );
      round_corner_xy( round_over, [-ear_lobe_width,ear_depth,ear_lobe_height], 1 );
    }
  } // end small_ear

  module big_ear() { // fka. right
    c = [ear_big_width,ear_depth,ear_thickness];
    difference() {
      union() {
	color("green") difference() { cube( c ); hole_with_recess( c, ear_big_hole ); }
	translate( [ear_big_width,ear_depth-ear_lobe_depth,upside_down?0:-ear_lobe_height+ear_thickness] ) lobe();
      }
      round_corner_xy( round_over, [ear_big_width+ear_lobe_width,0,ear_lobe_height], 3 );
      round_corner_xy( round_over, [ear_big_width+ear_lobe_width,ear_depth,ear_lobe_height], 0 );
    }
  } // end big_ear

  module gusset_up(percent, width, multiplier=1.5) {
    assert(percent >= 0 && percent <= 100);

    gusset_height = multiplier * width;

    pos = [0, baffle_thickness, thickness + baffle_height*percent/100 - gusset_height ]; 

    translate( [ support_thickness, 0, 0 ] + pos ) gusset(width,gusset_height,center=false);
    translate( [ inner_width-support_thickness, 0, 0 ] + pos ) rotate([0,0,90]) gusset(width,gusset_height,center=false);
  } // end gusset_up

  module frontcut() {
    h = front_cut[1];
    w = front_cut[0];
    translate( [-SMIDGE, -SMIDGE, -SMIDGE ] ) {
      translate( [0,0,h-w] ) right_triangle( w, w, inner_width+2*SMIDGE ); 
      cube( [ inner_width+2*SMIDGE, w+2*SMIDGE, (h-w)+2*SMIDGE ] );
    }
  } // end frontcut

  translate( [-inner_width/2,-baffle_thickness,0] ) {
    if( !filler_only ) {
      union() {
	difference() {
	  union() {
	    base();
	    handle();
	    baffle();
	    gusset_up( 100, 3, 1.5 );
	    translate( [ 0, baffle_thickness, thickness ] ) support();
	    translate( [ inner_width-support_thickness, baffle_thickness, thickness ] ) support();
	    translate( [ inner_width, raw_depth-ear_depth, baffle_height+thickness-ear_thickness ] ) big_ear();
	    translate( [ -ear_small_width, raw_depth-ear_depth, baffle_height+thickness-ear_thickness ] ) small_ear();
	  };
          frontcut();
	  round_corner_xy( min(round_over,baffle_height), [0, inner_depth, thickness+baffle_height], 1 );
	  round_corner_xy( min(round_over,baffle_height), [inner_width, inner_depth,thickness+baffle_height], 0 );
	}
      }
    }
    else {
      union() {
	difference() {
	  union() {
	    base();
	    baffle();
	    translate( [ 0, baffle_thickness, thickness ] ) support();
	    translate( [ inner_width-support_thickness, baffle_thickness, thickness ] ) support();
	    translate( [ inner_width, 0, 0 ] ) mirror( [1,0,0] ) {
	      translate( [ inner_width, raw_depth-ear_depth, 0 ] ) big_ear();
	      translate( [ -ear_small_width, raw_depth-ear_depth, 0 ] ) small_ear();
	    }
	  };
	  round_corner_xy( min(round_over,baffle_height), [0, inner_depth, thickness+baffle_height], 1 );
	  round_corner_xy( min(round_over,baffle_height), [inner_width, inner_depth, thickness+baffle_height], 0 );
	  round_corner_xz( round_over, [0, inner_depth, baffle_height+thickness], 3 );
	  round_corner_xz( round_over, [inner_width, inner_depth, baffle_height+thickness], 0 );
	}
      }
    }
  }
} // end Wyse_Blank

// Wyse_Filler:
//
// Generates a replacement blank to fill hole.
//
module Wyse_Filler() {
  config = [
    ["extra_depth", default_round_over],
    ["thickness", 1.6],
    ["baffle_height", 14],
    ["baffle_thickness", 1.6],
    ["support_thickness", 2],
  ];
  Wyse_Blank(config,filler_only=true);
} // end Wyse_Filler

Wyse_Blank($fn=48);
